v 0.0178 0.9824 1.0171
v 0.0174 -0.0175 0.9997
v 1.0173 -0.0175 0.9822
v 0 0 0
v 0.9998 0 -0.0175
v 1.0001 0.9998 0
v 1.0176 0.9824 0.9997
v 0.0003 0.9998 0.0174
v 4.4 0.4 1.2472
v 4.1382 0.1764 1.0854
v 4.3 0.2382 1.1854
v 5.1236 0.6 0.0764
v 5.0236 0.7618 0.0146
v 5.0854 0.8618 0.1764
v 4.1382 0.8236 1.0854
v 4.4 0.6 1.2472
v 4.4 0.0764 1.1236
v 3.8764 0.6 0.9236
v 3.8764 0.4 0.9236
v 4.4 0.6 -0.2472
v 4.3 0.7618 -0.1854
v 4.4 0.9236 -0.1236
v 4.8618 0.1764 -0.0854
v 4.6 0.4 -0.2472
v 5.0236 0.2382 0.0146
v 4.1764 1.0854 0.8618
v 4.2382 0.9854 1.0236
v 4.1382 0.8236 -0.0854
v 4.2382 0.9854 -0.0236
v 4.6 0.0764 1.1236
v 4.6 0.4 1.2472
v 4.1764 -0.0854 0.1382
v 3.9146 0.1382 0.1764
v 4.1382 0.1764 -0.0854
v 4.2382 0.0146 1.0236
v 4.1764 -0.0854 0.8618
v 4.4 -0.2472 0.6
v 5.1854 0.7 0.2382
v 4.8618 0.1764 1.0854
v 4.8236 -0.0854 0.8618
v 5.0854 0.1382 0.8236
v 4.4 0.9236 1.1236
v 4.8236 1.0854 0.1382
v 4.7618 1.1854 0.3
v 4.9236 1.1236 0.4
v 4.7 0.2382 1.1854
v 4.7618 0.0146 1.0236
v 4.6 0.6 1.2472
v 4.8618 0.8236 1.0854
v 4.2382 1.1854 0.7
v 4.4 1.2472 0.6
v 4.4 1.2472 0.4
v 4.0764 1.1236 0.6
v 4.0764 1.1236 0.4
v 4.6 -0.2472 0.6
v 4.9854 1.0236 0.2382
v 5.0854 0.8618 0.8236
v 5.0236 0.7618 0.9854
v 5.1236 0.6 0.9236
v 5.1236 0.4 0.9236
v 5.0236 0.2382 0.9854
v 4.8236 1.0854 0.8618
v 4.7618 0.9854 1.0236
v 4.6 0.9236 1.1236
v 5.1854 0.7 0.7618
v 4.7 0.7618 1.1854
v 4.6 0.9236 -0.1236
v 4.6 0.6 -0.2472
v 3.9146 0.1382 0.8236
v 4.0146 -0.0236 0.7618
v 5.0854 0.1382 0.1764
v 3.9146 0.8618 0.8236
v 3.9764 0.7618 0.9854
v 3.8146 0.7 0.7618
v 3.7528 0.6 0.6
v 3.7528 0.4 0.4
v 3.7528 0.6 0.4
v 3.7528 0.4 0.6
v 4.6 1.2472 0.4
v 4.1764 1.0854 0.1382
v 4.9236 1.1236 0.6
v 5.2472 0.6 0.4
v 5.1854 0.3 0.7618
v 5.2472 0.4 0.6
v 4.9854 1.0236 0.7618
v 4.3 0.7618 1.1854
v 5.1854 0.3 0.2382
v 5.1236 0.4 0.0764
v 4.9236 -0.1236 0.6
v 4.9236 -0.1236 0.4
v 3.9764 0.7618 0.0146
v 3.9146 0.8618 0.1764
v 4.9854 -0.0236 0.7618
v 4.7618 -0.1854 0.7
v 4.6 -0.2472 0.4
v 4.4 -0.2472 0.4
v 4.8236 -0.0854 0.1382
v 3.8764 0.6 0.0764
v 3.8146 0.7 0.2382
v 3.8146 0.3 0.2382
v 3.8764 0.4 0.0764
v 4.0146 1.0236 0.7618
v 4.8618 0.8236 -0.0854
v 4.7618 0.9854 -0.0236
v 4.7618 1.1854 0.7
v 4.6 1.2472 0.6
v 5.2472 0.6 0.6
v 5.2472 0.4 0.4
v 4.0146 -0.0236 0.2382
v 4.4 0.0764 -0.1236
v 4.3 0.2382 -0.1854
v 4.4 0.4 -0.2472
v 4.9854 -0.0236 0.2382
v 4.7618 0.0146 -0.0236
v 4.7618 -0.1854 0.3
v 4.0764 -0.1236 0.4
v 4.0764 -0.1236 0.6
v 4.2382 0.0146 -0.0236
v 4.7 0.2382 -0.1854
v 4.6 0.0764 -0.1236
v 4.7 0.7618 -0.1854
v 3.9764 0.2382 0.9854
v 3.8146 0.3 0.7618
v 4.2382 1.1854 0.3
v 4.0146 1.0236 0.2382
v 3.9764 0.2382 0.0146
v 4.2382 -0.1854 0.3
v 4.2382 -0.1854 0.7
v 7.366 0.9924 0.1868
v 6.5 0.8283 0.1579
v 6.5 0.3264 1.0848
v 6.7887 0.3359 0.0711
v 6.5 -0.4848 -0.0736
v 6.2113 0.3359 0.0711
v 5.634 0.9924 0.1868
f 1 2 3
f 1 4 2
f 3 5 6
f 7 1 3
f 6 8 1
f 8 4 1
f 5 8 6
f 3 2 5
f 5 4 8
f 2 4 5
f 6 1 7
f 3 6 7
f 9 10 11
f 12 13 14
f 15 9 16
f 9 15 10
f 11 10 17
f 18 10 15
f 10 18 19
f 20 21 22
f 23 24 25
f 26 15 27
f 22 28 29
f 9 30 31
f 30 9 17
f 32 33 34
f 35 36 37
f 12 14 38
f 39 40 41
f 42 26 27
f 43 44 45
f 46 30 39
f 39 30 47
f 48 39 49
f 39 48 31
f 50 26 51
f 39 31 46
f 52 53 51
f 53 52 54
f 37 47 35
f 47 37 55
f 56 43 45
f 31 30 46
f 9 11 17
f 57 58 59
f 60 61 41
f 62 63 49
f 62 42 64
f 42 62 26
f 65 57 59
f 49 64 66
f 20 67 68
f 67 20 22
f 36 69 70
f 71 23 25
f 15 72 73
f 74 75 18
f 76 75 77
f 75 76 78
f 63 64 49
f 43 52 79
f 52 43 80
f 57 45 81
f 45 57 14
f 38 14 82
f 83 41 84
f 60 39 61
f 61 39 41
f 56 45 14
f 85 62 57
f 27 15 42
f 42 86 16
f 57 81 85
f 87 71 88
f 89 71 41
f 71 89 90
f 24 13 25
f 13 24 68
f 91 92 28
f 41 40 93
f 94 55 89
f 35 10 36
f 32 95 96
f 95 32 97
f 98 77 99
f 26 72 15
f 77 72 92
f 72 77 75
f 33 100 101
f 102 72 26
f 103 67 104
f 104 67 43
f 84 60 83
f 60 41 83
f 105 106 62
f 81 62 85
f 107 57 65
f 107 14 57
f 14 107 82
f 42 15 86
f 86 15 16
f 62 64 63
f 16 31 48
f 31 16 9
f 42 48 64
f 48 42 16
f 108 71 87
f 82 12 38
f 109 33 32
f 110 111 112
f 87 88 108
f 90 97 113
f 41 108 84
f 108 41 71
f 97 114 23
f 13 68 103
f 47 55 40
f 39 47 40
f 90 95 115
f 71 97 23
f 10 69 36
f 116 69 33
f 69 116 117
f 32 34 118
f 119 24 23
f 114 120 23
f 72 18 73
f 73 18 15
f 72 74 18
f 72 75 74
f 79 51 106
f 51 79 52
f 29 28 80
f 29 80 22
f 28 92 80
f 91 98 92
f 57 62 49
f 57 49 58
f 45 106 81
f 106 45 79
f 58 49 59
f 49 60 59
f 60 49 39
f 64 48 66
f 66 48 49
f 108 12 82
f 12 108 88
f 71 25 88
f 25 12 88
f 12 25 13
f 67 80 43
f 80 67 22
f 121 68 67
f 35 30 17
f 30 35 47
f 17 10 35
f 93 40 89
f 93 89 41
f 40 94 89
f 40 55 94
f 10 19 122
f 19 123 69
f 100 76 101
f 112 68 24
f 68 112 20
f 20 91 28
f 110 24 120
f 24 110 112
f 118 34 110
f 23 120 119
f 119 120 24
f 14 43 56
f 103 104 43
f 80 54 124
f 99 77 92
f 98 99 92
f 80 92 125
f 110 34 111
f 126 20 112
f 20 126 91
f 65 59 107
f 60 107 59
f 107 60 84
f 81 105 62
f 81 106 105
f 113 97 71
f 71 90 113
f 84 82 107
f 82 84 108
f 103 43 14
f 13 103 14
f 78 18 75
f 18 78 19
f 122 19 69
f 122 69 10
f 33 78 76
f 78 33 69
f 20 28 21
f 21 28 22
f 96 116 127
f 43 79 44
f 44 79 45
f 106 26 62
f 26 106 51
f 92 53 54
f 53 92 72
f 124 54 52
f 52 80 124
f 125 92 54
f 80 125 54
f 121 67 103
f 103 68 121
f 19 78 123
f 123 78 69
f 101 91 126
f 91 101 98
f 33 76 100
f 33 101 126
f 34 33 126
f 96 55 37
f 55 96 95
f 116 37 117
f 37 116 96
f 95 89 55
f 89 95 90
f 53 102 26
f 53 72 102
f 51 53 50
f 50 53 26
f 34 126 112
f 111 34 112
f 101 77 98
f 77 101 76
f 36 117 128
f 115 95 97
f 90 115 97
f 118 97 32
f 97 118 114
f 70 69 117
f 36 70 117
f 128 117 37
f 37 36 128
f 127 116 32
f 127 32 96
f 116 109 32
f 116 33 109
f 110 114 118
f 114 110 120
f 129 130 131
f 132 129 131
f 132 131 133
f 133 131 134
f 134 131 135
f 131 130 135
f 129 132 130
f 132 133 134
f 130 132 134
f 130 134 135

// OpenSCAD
// Volume: 2.9431024781319937, SurfaceArea: 16.62159871718035
// Used to cause issue #349

// Very slightly non-planar polyhedron
polyhedron(faces=[[3,2,1,0],[7,6,5,4],[0,1,6,7],[1,2,5,6],[2,3,4,5],[3,0,7,4]],
points=[
    [0.0174497,-0.0174524,0.999695],
    [1.0173,-0.0174524,0.982243],
    [1.0176,0.982395,0.999693],
    [0.0177543,0.982395,1.01715],
    [0.000304586,0.999848,0.0174497],
    [1.00015,0.999848,-0.00000265809],
    [0.999848,-0.0000000000000271051,-0.0174524],
    [0,0,0]]);

// Real-world example: truncated icosidodecahedron
translate([4.5,0.5,0.5]) scale(0.02) polyhedron(points = [
[-10., -13.090169943749475, -34.270509831248425], 
[-10., -13.090169943749475, 34.270509831248425], 
[-10., 13.090169943749475, -34.270509831248425], 
[-10., 13.090169943749475, 34.270509831248425], 
[-5., -5., -37.3606797749979], [-5., -5., 37.3606797749979], 
[-5., 5., -37.3606797749979], [-5., 5., 37.3606797749979], 
[-5., -37.3606797749979, -5.], [-5., -37.3606797749979, 5.], 
[-5., -21.18033988749895, -31.18033988749895], 
[-5., -21.18033988749895, 31.18033988749895], [-5., 37.3606797749979, -5.], 
[-5., 37.3606797749979, 5.], [-5., 21.18033988749895, -31.18033988749895], 
[-5., 21.18033988749895, 31.18033988749895], [5., -5., -37.3606797749979], 
[5., -5., 37.3606797749979], [5., 5., -37.3606797749979], 
[5., 5., 37.3606797749979], [5., -37.3606797749979, -5.], 
[5., -37.3606797749979, 5.], [5., -21.18033988749895, -31.18033988749895], 
[5., -21.18033988749895, 31.18033988749895], [5., 37.3606797749979, -5.], 
[5., 37.3606797749979, 5.], [5., 21.18033988749895, -31.18033988749895], 
[5., 21.18033988749895, 31.18033988749895], [10., -13.090169943749475, 
 -34.270509831248425], [10., -13.090169943749475, 34.270509831248425], 
[10., 13.090169943749475, -34.270509831248425], 
[10., 13.090169943749475, 34.270509831248425], 
[-34.270509831248425, -10., -13.090169943749475], 
[-34.270509831248425, -10., 13.090169943749475], 
[-34.270509831248425, 10., -13.090169943749475], 
[-34.270509831248425, 10., 13.090169943749475], 
[-29.270509831248425, -18.090169943749473, -16.18033988749895], 
[-29.270509831248425, -18.090169943749473, 16.18033988749895], 
[-29.270509831248425, 18.090169943749473, -16.18033988749895], 
[-29.270509831248425, 18.090169943749473, 16.18033988749895], 
[-18.090169943749473, -16.18033988749895, -29.270509831248425], 
[-18.090169943749473, -16.18033988749895, 29.270509831248425], 
[-18.090169943749473, 16.18033988749895, -29.270509831248425], 
[-18.090169943749473, 16.18033988749895, 29.270509831248425], 
[-13.090169943749475, -34.270509831248425, -10.], 
[-13.090169943749475, -34.270509831248425, 10.], 
[-13.090169943749475, -24.270509831248425, -26.18033988749895], 
[-13.090169943749475, -24.270509831248425, 26.18033988749895], 
[-13.090169943749475, 24.270509831248425, -26.18033988749895], 
[-13.090169943749475, 24.270509831248425, 26.18033988749895], 
[-13.090169943749475, 34.270509831248425, -10.], 
[-13.090169943749475, 34.270509831248425, 10.], 
[-26.18033988749895, -13.090169943749475, -24.270509831248425], 
[-26.18033988749895, -13.090169943749475, 24.270509831248425], 
[-26.18033988749895, 13.090169943749475, -24.270509831248425], 
[-26.18033988749895, 13.090169943749475, 24.270509831248425], 
[-37.3606797749979, -5., -5.], [-37.3606797749979, -5., 5.], 
[-37.3606797749979, 5., -5.], [-37.3606797749979, 5., 5.], 
[-16.18033988749895, -29.270509831248425, -18.090169943749473], 
[-16.18033988749895, -29.270509831248425, 18.090169943749473], 
[-16.18033988749895, 29.270509831248425, -18.090169943749473], 
[-16.18033988749895, 29.270509831248425, 18.090169943749473], 
[-31.18033988749895, -5., -21.18033988749895], 
[-31.18033988749895, -5., 21.18033988749895], 
[-31.18033988749895, 5., -21.18033988749895], 
[-31.18033988749895, 5., 21.18033988749895], 
[-21.18033988749895, -31.18033988749895, -5.], 
[-21.18033988749895, -31.18033988749895, 5.], 
[-21.18033988749895, 31.18033988749895, -5.], 
[-21.18033988749895, 31.18033988749895, 5.], 
[-24.270509831248425, -26.18033988749895, -13.090169943749475], 
[-24.270509831248425, -26.18033988749895, 13.090169943749475], 
[-24.270509831248425, 26.18033988749895, -13.090169943749475], 
[-24.270509831248425, 26.18033988749895, 13.090169943749475], 
[16.18033988749895, -29.270509831248425, -18.090169943749473], 
[16.18033988749895, -29.270509831248425, 18.090169943749473], 
[16.18033988749895, 29.270509831248425, -18.090169943749473], 
[16.18033988749895, 29.270509831248425, 18.090169943749473], 
[24.270509831248425, -26.18033988749895, -13.090169943749475], 
[24.270509831248425, -26.18033988749895, 13.090169943749475], 
[24.270509831248425, 26.18033988749895, -13.090169943749475], 
[24.270509831248425, 26.18033988749895, 13.090169943749475], 
[37.3606797749979, -5., -5.], [37.3606797749979, -5., 5.], 
[37.3606797749979, 5., -5.], [37.3606797749979, 5., 5.], 
[21.18033988749895, -31.18033988749895, -5.], 
[21.18033988749895, -31.18033988749895, 5.], 
[21.18033988749895, 31.18033988749895, -5.], 
[21.18033988749895, 31.18033988749895, 5.], 
[13.090169943749475, -34.270509831248425, -10.], 
[13.090169943749475, -34.270509831248425, 10.], 
[13.090169943749475, -24.270509831248425, -26.18033988749895], 
[13.090169943749475, -24.270509831248425, 26.18033988749895], 
[13.090169943749475, 24.270509831248425, -26.18033988749895], 
[13.090169943749475, 24.270509831248425, 26.18033988749895], 
[13.090169943749475, 34.270509831248425, -10.], 
[13.090169943749475, 34.270509831248425, 10.], 
[26.18033988749895, -13.090169943749475, -24.270509831248425], 
[26.18033988749895, -13.090169943749475, 24.270509831248425], 
[26.18033988749895, 13.090169943749475, -24.270509831248425], 
[26.18033988749895, 13.090169943749475, 24.270509831248425], 
[31.18033988749895, -5., -21.18033988749895], 
[31.18033988749895, -5., 21.18033988749895], 
[31.18033988749895, 5., -21.18033988749895], 
[31.18033988749895, 5., 21.18033988749895], 
[18.090169943749473, -16.18033988749895, -29.270509831248425], 
[18.090169943749473, -16.18033988749895, 29.270509831248425], 
[18.090169943749473, 16.18033988749895, -29.270509831248425], 
[18.090169943749473, 16.18033988749895, 29.270509831248425], 
[29.270509831248425, -18.090169943749473, -16.18033988749895], 
[29.270509831248425, -18.090169943749473, 16.18033988749895], 
[29.270509831248425, 18.090169943749473, -16.18033988749895], 
[29.270509831248425, 18.090169943749473, 16.18033988749895], 
[34.270509831248425, -10., -13.090169943749475], 
[34.270509831248425, -10., 13.090169943749475], 
[34.270509831248425, 10., -13.090169943749475], 
[34.270509831248425, 10., 13.090169943749475]],faces = 
[[41, 53, 65, 67, 55, 43, 3, 7, 5, 1], [100, 104, 106, 102, 110, 30, 18, 16, 
 28, 108], [11, 1, 5, 17, 29, 23], [18, 30, 26, 14, 2, 6], 
[33, 37, 73, 69, 68, 72, 36, 32, 56, 57], [91, 90, 82, 114, 118, 86, 87, 
 119, 115, 83], [81, 113, 117, 85, 84, 116, 112, 80, 88, 89], 
[59, 58, 34, 38, 74, 70, 71, 75, 39, 35], [0, 10, 22, 28, 16, 4], 
[15, 27, 31, 19, 7, 3], [64, 52, 40, 0, 4, 6, 2, 42, 54, 66], 
[19, 31, 111, 103, 107, 105, 101, 109, 29, 17], [96, 110, 102, 114, 82, 78], 
[53, 41, 47, 61, 73, 37], [43, 49, 15, 3], [94, 108, 28, 22], 
[23, 29, 109, 95], [2, 14, 48, 42], [36, 72, 60, 46, 40, 52], 
[79, 83, 115, 103, 111, 97], [69, 45, 9, 8, 44, 68], 
[24, 98, 90, 91, 99, 25], [77, 95, 109, 101, 113, 81], 
[42, 48, 62, 74, 38, 54], [40, 46, 10, 0], [97, 111, 31, 27], 
[44, 8, 20, 92, 76, 94, 22, 10, 46, 60], [63, 51, 13, 25, 99, 79, 97, 27, 
 15, 49], [26, 30, 110, 96], [1, 11, 47, 41], [55, 39, 75, 63, 49, 43], 
[80, 112, 100, 108, 94, 76], [48, 14, 26, 96, 78, 98, 24, 12, 50, 62], 
[61, 47, 11, 23, 95, 77, 93, 21, 9, 45], [71, 70, 50, 12, 13, 51], 
[93, 89, 88, 92, 20, 21], [102, 106, 118, 114], [65, 53, 37, 33], 
[74, 62, 50, 70], [77, 81, 89, 93], [101, 105, 117, 113], [66, 54, 38, 34], 
[73, 61, 45, 69], [78, 82, 90, 98], [32, 36, 52, 64], [115, 119, 107, 103], 
[92, 88, 80, 76], [71, 51, 63, 75], [56, 32, 64, 66, 34, 58], 
[107, 119, 87, 85, 117, 105], [35, 39, 55, 67], [112, 116, 104, 100], 
[99, 91, 83, 79], [68, 44, 60, 72], [57, 59, 35, 67, 65, 33], 
[116, 84, 86, 118, 106, 104], [4, 16, 18, 6], [7, 19, 17, 5], 
[12, 24, 25, 13], [9, 21, 20, 8], [56, 58, 59, 57], [85, 87, 86, 84]]
);

translate([6,0,0]) polyhedron(points = [[0.5, 0.326352, 1.08481], [0.5, 0.828269, 0.157883], [1.36603, 0.992404, 0.186824], [0.788675, 0.335865, 0.0710586], [0.5, -0.484808, -0.0736482], [0.211325, 0.335865, 0.0710586], [-0.366025, 0.992404, 0.186824]], faces = [[0, 1, 2], [0, 2, 3], [0, 3, 4], [0, 4, 5], [0, 5, 6], [0, 6, 1], [6, 5, 4, 3, 2, 1]]);
